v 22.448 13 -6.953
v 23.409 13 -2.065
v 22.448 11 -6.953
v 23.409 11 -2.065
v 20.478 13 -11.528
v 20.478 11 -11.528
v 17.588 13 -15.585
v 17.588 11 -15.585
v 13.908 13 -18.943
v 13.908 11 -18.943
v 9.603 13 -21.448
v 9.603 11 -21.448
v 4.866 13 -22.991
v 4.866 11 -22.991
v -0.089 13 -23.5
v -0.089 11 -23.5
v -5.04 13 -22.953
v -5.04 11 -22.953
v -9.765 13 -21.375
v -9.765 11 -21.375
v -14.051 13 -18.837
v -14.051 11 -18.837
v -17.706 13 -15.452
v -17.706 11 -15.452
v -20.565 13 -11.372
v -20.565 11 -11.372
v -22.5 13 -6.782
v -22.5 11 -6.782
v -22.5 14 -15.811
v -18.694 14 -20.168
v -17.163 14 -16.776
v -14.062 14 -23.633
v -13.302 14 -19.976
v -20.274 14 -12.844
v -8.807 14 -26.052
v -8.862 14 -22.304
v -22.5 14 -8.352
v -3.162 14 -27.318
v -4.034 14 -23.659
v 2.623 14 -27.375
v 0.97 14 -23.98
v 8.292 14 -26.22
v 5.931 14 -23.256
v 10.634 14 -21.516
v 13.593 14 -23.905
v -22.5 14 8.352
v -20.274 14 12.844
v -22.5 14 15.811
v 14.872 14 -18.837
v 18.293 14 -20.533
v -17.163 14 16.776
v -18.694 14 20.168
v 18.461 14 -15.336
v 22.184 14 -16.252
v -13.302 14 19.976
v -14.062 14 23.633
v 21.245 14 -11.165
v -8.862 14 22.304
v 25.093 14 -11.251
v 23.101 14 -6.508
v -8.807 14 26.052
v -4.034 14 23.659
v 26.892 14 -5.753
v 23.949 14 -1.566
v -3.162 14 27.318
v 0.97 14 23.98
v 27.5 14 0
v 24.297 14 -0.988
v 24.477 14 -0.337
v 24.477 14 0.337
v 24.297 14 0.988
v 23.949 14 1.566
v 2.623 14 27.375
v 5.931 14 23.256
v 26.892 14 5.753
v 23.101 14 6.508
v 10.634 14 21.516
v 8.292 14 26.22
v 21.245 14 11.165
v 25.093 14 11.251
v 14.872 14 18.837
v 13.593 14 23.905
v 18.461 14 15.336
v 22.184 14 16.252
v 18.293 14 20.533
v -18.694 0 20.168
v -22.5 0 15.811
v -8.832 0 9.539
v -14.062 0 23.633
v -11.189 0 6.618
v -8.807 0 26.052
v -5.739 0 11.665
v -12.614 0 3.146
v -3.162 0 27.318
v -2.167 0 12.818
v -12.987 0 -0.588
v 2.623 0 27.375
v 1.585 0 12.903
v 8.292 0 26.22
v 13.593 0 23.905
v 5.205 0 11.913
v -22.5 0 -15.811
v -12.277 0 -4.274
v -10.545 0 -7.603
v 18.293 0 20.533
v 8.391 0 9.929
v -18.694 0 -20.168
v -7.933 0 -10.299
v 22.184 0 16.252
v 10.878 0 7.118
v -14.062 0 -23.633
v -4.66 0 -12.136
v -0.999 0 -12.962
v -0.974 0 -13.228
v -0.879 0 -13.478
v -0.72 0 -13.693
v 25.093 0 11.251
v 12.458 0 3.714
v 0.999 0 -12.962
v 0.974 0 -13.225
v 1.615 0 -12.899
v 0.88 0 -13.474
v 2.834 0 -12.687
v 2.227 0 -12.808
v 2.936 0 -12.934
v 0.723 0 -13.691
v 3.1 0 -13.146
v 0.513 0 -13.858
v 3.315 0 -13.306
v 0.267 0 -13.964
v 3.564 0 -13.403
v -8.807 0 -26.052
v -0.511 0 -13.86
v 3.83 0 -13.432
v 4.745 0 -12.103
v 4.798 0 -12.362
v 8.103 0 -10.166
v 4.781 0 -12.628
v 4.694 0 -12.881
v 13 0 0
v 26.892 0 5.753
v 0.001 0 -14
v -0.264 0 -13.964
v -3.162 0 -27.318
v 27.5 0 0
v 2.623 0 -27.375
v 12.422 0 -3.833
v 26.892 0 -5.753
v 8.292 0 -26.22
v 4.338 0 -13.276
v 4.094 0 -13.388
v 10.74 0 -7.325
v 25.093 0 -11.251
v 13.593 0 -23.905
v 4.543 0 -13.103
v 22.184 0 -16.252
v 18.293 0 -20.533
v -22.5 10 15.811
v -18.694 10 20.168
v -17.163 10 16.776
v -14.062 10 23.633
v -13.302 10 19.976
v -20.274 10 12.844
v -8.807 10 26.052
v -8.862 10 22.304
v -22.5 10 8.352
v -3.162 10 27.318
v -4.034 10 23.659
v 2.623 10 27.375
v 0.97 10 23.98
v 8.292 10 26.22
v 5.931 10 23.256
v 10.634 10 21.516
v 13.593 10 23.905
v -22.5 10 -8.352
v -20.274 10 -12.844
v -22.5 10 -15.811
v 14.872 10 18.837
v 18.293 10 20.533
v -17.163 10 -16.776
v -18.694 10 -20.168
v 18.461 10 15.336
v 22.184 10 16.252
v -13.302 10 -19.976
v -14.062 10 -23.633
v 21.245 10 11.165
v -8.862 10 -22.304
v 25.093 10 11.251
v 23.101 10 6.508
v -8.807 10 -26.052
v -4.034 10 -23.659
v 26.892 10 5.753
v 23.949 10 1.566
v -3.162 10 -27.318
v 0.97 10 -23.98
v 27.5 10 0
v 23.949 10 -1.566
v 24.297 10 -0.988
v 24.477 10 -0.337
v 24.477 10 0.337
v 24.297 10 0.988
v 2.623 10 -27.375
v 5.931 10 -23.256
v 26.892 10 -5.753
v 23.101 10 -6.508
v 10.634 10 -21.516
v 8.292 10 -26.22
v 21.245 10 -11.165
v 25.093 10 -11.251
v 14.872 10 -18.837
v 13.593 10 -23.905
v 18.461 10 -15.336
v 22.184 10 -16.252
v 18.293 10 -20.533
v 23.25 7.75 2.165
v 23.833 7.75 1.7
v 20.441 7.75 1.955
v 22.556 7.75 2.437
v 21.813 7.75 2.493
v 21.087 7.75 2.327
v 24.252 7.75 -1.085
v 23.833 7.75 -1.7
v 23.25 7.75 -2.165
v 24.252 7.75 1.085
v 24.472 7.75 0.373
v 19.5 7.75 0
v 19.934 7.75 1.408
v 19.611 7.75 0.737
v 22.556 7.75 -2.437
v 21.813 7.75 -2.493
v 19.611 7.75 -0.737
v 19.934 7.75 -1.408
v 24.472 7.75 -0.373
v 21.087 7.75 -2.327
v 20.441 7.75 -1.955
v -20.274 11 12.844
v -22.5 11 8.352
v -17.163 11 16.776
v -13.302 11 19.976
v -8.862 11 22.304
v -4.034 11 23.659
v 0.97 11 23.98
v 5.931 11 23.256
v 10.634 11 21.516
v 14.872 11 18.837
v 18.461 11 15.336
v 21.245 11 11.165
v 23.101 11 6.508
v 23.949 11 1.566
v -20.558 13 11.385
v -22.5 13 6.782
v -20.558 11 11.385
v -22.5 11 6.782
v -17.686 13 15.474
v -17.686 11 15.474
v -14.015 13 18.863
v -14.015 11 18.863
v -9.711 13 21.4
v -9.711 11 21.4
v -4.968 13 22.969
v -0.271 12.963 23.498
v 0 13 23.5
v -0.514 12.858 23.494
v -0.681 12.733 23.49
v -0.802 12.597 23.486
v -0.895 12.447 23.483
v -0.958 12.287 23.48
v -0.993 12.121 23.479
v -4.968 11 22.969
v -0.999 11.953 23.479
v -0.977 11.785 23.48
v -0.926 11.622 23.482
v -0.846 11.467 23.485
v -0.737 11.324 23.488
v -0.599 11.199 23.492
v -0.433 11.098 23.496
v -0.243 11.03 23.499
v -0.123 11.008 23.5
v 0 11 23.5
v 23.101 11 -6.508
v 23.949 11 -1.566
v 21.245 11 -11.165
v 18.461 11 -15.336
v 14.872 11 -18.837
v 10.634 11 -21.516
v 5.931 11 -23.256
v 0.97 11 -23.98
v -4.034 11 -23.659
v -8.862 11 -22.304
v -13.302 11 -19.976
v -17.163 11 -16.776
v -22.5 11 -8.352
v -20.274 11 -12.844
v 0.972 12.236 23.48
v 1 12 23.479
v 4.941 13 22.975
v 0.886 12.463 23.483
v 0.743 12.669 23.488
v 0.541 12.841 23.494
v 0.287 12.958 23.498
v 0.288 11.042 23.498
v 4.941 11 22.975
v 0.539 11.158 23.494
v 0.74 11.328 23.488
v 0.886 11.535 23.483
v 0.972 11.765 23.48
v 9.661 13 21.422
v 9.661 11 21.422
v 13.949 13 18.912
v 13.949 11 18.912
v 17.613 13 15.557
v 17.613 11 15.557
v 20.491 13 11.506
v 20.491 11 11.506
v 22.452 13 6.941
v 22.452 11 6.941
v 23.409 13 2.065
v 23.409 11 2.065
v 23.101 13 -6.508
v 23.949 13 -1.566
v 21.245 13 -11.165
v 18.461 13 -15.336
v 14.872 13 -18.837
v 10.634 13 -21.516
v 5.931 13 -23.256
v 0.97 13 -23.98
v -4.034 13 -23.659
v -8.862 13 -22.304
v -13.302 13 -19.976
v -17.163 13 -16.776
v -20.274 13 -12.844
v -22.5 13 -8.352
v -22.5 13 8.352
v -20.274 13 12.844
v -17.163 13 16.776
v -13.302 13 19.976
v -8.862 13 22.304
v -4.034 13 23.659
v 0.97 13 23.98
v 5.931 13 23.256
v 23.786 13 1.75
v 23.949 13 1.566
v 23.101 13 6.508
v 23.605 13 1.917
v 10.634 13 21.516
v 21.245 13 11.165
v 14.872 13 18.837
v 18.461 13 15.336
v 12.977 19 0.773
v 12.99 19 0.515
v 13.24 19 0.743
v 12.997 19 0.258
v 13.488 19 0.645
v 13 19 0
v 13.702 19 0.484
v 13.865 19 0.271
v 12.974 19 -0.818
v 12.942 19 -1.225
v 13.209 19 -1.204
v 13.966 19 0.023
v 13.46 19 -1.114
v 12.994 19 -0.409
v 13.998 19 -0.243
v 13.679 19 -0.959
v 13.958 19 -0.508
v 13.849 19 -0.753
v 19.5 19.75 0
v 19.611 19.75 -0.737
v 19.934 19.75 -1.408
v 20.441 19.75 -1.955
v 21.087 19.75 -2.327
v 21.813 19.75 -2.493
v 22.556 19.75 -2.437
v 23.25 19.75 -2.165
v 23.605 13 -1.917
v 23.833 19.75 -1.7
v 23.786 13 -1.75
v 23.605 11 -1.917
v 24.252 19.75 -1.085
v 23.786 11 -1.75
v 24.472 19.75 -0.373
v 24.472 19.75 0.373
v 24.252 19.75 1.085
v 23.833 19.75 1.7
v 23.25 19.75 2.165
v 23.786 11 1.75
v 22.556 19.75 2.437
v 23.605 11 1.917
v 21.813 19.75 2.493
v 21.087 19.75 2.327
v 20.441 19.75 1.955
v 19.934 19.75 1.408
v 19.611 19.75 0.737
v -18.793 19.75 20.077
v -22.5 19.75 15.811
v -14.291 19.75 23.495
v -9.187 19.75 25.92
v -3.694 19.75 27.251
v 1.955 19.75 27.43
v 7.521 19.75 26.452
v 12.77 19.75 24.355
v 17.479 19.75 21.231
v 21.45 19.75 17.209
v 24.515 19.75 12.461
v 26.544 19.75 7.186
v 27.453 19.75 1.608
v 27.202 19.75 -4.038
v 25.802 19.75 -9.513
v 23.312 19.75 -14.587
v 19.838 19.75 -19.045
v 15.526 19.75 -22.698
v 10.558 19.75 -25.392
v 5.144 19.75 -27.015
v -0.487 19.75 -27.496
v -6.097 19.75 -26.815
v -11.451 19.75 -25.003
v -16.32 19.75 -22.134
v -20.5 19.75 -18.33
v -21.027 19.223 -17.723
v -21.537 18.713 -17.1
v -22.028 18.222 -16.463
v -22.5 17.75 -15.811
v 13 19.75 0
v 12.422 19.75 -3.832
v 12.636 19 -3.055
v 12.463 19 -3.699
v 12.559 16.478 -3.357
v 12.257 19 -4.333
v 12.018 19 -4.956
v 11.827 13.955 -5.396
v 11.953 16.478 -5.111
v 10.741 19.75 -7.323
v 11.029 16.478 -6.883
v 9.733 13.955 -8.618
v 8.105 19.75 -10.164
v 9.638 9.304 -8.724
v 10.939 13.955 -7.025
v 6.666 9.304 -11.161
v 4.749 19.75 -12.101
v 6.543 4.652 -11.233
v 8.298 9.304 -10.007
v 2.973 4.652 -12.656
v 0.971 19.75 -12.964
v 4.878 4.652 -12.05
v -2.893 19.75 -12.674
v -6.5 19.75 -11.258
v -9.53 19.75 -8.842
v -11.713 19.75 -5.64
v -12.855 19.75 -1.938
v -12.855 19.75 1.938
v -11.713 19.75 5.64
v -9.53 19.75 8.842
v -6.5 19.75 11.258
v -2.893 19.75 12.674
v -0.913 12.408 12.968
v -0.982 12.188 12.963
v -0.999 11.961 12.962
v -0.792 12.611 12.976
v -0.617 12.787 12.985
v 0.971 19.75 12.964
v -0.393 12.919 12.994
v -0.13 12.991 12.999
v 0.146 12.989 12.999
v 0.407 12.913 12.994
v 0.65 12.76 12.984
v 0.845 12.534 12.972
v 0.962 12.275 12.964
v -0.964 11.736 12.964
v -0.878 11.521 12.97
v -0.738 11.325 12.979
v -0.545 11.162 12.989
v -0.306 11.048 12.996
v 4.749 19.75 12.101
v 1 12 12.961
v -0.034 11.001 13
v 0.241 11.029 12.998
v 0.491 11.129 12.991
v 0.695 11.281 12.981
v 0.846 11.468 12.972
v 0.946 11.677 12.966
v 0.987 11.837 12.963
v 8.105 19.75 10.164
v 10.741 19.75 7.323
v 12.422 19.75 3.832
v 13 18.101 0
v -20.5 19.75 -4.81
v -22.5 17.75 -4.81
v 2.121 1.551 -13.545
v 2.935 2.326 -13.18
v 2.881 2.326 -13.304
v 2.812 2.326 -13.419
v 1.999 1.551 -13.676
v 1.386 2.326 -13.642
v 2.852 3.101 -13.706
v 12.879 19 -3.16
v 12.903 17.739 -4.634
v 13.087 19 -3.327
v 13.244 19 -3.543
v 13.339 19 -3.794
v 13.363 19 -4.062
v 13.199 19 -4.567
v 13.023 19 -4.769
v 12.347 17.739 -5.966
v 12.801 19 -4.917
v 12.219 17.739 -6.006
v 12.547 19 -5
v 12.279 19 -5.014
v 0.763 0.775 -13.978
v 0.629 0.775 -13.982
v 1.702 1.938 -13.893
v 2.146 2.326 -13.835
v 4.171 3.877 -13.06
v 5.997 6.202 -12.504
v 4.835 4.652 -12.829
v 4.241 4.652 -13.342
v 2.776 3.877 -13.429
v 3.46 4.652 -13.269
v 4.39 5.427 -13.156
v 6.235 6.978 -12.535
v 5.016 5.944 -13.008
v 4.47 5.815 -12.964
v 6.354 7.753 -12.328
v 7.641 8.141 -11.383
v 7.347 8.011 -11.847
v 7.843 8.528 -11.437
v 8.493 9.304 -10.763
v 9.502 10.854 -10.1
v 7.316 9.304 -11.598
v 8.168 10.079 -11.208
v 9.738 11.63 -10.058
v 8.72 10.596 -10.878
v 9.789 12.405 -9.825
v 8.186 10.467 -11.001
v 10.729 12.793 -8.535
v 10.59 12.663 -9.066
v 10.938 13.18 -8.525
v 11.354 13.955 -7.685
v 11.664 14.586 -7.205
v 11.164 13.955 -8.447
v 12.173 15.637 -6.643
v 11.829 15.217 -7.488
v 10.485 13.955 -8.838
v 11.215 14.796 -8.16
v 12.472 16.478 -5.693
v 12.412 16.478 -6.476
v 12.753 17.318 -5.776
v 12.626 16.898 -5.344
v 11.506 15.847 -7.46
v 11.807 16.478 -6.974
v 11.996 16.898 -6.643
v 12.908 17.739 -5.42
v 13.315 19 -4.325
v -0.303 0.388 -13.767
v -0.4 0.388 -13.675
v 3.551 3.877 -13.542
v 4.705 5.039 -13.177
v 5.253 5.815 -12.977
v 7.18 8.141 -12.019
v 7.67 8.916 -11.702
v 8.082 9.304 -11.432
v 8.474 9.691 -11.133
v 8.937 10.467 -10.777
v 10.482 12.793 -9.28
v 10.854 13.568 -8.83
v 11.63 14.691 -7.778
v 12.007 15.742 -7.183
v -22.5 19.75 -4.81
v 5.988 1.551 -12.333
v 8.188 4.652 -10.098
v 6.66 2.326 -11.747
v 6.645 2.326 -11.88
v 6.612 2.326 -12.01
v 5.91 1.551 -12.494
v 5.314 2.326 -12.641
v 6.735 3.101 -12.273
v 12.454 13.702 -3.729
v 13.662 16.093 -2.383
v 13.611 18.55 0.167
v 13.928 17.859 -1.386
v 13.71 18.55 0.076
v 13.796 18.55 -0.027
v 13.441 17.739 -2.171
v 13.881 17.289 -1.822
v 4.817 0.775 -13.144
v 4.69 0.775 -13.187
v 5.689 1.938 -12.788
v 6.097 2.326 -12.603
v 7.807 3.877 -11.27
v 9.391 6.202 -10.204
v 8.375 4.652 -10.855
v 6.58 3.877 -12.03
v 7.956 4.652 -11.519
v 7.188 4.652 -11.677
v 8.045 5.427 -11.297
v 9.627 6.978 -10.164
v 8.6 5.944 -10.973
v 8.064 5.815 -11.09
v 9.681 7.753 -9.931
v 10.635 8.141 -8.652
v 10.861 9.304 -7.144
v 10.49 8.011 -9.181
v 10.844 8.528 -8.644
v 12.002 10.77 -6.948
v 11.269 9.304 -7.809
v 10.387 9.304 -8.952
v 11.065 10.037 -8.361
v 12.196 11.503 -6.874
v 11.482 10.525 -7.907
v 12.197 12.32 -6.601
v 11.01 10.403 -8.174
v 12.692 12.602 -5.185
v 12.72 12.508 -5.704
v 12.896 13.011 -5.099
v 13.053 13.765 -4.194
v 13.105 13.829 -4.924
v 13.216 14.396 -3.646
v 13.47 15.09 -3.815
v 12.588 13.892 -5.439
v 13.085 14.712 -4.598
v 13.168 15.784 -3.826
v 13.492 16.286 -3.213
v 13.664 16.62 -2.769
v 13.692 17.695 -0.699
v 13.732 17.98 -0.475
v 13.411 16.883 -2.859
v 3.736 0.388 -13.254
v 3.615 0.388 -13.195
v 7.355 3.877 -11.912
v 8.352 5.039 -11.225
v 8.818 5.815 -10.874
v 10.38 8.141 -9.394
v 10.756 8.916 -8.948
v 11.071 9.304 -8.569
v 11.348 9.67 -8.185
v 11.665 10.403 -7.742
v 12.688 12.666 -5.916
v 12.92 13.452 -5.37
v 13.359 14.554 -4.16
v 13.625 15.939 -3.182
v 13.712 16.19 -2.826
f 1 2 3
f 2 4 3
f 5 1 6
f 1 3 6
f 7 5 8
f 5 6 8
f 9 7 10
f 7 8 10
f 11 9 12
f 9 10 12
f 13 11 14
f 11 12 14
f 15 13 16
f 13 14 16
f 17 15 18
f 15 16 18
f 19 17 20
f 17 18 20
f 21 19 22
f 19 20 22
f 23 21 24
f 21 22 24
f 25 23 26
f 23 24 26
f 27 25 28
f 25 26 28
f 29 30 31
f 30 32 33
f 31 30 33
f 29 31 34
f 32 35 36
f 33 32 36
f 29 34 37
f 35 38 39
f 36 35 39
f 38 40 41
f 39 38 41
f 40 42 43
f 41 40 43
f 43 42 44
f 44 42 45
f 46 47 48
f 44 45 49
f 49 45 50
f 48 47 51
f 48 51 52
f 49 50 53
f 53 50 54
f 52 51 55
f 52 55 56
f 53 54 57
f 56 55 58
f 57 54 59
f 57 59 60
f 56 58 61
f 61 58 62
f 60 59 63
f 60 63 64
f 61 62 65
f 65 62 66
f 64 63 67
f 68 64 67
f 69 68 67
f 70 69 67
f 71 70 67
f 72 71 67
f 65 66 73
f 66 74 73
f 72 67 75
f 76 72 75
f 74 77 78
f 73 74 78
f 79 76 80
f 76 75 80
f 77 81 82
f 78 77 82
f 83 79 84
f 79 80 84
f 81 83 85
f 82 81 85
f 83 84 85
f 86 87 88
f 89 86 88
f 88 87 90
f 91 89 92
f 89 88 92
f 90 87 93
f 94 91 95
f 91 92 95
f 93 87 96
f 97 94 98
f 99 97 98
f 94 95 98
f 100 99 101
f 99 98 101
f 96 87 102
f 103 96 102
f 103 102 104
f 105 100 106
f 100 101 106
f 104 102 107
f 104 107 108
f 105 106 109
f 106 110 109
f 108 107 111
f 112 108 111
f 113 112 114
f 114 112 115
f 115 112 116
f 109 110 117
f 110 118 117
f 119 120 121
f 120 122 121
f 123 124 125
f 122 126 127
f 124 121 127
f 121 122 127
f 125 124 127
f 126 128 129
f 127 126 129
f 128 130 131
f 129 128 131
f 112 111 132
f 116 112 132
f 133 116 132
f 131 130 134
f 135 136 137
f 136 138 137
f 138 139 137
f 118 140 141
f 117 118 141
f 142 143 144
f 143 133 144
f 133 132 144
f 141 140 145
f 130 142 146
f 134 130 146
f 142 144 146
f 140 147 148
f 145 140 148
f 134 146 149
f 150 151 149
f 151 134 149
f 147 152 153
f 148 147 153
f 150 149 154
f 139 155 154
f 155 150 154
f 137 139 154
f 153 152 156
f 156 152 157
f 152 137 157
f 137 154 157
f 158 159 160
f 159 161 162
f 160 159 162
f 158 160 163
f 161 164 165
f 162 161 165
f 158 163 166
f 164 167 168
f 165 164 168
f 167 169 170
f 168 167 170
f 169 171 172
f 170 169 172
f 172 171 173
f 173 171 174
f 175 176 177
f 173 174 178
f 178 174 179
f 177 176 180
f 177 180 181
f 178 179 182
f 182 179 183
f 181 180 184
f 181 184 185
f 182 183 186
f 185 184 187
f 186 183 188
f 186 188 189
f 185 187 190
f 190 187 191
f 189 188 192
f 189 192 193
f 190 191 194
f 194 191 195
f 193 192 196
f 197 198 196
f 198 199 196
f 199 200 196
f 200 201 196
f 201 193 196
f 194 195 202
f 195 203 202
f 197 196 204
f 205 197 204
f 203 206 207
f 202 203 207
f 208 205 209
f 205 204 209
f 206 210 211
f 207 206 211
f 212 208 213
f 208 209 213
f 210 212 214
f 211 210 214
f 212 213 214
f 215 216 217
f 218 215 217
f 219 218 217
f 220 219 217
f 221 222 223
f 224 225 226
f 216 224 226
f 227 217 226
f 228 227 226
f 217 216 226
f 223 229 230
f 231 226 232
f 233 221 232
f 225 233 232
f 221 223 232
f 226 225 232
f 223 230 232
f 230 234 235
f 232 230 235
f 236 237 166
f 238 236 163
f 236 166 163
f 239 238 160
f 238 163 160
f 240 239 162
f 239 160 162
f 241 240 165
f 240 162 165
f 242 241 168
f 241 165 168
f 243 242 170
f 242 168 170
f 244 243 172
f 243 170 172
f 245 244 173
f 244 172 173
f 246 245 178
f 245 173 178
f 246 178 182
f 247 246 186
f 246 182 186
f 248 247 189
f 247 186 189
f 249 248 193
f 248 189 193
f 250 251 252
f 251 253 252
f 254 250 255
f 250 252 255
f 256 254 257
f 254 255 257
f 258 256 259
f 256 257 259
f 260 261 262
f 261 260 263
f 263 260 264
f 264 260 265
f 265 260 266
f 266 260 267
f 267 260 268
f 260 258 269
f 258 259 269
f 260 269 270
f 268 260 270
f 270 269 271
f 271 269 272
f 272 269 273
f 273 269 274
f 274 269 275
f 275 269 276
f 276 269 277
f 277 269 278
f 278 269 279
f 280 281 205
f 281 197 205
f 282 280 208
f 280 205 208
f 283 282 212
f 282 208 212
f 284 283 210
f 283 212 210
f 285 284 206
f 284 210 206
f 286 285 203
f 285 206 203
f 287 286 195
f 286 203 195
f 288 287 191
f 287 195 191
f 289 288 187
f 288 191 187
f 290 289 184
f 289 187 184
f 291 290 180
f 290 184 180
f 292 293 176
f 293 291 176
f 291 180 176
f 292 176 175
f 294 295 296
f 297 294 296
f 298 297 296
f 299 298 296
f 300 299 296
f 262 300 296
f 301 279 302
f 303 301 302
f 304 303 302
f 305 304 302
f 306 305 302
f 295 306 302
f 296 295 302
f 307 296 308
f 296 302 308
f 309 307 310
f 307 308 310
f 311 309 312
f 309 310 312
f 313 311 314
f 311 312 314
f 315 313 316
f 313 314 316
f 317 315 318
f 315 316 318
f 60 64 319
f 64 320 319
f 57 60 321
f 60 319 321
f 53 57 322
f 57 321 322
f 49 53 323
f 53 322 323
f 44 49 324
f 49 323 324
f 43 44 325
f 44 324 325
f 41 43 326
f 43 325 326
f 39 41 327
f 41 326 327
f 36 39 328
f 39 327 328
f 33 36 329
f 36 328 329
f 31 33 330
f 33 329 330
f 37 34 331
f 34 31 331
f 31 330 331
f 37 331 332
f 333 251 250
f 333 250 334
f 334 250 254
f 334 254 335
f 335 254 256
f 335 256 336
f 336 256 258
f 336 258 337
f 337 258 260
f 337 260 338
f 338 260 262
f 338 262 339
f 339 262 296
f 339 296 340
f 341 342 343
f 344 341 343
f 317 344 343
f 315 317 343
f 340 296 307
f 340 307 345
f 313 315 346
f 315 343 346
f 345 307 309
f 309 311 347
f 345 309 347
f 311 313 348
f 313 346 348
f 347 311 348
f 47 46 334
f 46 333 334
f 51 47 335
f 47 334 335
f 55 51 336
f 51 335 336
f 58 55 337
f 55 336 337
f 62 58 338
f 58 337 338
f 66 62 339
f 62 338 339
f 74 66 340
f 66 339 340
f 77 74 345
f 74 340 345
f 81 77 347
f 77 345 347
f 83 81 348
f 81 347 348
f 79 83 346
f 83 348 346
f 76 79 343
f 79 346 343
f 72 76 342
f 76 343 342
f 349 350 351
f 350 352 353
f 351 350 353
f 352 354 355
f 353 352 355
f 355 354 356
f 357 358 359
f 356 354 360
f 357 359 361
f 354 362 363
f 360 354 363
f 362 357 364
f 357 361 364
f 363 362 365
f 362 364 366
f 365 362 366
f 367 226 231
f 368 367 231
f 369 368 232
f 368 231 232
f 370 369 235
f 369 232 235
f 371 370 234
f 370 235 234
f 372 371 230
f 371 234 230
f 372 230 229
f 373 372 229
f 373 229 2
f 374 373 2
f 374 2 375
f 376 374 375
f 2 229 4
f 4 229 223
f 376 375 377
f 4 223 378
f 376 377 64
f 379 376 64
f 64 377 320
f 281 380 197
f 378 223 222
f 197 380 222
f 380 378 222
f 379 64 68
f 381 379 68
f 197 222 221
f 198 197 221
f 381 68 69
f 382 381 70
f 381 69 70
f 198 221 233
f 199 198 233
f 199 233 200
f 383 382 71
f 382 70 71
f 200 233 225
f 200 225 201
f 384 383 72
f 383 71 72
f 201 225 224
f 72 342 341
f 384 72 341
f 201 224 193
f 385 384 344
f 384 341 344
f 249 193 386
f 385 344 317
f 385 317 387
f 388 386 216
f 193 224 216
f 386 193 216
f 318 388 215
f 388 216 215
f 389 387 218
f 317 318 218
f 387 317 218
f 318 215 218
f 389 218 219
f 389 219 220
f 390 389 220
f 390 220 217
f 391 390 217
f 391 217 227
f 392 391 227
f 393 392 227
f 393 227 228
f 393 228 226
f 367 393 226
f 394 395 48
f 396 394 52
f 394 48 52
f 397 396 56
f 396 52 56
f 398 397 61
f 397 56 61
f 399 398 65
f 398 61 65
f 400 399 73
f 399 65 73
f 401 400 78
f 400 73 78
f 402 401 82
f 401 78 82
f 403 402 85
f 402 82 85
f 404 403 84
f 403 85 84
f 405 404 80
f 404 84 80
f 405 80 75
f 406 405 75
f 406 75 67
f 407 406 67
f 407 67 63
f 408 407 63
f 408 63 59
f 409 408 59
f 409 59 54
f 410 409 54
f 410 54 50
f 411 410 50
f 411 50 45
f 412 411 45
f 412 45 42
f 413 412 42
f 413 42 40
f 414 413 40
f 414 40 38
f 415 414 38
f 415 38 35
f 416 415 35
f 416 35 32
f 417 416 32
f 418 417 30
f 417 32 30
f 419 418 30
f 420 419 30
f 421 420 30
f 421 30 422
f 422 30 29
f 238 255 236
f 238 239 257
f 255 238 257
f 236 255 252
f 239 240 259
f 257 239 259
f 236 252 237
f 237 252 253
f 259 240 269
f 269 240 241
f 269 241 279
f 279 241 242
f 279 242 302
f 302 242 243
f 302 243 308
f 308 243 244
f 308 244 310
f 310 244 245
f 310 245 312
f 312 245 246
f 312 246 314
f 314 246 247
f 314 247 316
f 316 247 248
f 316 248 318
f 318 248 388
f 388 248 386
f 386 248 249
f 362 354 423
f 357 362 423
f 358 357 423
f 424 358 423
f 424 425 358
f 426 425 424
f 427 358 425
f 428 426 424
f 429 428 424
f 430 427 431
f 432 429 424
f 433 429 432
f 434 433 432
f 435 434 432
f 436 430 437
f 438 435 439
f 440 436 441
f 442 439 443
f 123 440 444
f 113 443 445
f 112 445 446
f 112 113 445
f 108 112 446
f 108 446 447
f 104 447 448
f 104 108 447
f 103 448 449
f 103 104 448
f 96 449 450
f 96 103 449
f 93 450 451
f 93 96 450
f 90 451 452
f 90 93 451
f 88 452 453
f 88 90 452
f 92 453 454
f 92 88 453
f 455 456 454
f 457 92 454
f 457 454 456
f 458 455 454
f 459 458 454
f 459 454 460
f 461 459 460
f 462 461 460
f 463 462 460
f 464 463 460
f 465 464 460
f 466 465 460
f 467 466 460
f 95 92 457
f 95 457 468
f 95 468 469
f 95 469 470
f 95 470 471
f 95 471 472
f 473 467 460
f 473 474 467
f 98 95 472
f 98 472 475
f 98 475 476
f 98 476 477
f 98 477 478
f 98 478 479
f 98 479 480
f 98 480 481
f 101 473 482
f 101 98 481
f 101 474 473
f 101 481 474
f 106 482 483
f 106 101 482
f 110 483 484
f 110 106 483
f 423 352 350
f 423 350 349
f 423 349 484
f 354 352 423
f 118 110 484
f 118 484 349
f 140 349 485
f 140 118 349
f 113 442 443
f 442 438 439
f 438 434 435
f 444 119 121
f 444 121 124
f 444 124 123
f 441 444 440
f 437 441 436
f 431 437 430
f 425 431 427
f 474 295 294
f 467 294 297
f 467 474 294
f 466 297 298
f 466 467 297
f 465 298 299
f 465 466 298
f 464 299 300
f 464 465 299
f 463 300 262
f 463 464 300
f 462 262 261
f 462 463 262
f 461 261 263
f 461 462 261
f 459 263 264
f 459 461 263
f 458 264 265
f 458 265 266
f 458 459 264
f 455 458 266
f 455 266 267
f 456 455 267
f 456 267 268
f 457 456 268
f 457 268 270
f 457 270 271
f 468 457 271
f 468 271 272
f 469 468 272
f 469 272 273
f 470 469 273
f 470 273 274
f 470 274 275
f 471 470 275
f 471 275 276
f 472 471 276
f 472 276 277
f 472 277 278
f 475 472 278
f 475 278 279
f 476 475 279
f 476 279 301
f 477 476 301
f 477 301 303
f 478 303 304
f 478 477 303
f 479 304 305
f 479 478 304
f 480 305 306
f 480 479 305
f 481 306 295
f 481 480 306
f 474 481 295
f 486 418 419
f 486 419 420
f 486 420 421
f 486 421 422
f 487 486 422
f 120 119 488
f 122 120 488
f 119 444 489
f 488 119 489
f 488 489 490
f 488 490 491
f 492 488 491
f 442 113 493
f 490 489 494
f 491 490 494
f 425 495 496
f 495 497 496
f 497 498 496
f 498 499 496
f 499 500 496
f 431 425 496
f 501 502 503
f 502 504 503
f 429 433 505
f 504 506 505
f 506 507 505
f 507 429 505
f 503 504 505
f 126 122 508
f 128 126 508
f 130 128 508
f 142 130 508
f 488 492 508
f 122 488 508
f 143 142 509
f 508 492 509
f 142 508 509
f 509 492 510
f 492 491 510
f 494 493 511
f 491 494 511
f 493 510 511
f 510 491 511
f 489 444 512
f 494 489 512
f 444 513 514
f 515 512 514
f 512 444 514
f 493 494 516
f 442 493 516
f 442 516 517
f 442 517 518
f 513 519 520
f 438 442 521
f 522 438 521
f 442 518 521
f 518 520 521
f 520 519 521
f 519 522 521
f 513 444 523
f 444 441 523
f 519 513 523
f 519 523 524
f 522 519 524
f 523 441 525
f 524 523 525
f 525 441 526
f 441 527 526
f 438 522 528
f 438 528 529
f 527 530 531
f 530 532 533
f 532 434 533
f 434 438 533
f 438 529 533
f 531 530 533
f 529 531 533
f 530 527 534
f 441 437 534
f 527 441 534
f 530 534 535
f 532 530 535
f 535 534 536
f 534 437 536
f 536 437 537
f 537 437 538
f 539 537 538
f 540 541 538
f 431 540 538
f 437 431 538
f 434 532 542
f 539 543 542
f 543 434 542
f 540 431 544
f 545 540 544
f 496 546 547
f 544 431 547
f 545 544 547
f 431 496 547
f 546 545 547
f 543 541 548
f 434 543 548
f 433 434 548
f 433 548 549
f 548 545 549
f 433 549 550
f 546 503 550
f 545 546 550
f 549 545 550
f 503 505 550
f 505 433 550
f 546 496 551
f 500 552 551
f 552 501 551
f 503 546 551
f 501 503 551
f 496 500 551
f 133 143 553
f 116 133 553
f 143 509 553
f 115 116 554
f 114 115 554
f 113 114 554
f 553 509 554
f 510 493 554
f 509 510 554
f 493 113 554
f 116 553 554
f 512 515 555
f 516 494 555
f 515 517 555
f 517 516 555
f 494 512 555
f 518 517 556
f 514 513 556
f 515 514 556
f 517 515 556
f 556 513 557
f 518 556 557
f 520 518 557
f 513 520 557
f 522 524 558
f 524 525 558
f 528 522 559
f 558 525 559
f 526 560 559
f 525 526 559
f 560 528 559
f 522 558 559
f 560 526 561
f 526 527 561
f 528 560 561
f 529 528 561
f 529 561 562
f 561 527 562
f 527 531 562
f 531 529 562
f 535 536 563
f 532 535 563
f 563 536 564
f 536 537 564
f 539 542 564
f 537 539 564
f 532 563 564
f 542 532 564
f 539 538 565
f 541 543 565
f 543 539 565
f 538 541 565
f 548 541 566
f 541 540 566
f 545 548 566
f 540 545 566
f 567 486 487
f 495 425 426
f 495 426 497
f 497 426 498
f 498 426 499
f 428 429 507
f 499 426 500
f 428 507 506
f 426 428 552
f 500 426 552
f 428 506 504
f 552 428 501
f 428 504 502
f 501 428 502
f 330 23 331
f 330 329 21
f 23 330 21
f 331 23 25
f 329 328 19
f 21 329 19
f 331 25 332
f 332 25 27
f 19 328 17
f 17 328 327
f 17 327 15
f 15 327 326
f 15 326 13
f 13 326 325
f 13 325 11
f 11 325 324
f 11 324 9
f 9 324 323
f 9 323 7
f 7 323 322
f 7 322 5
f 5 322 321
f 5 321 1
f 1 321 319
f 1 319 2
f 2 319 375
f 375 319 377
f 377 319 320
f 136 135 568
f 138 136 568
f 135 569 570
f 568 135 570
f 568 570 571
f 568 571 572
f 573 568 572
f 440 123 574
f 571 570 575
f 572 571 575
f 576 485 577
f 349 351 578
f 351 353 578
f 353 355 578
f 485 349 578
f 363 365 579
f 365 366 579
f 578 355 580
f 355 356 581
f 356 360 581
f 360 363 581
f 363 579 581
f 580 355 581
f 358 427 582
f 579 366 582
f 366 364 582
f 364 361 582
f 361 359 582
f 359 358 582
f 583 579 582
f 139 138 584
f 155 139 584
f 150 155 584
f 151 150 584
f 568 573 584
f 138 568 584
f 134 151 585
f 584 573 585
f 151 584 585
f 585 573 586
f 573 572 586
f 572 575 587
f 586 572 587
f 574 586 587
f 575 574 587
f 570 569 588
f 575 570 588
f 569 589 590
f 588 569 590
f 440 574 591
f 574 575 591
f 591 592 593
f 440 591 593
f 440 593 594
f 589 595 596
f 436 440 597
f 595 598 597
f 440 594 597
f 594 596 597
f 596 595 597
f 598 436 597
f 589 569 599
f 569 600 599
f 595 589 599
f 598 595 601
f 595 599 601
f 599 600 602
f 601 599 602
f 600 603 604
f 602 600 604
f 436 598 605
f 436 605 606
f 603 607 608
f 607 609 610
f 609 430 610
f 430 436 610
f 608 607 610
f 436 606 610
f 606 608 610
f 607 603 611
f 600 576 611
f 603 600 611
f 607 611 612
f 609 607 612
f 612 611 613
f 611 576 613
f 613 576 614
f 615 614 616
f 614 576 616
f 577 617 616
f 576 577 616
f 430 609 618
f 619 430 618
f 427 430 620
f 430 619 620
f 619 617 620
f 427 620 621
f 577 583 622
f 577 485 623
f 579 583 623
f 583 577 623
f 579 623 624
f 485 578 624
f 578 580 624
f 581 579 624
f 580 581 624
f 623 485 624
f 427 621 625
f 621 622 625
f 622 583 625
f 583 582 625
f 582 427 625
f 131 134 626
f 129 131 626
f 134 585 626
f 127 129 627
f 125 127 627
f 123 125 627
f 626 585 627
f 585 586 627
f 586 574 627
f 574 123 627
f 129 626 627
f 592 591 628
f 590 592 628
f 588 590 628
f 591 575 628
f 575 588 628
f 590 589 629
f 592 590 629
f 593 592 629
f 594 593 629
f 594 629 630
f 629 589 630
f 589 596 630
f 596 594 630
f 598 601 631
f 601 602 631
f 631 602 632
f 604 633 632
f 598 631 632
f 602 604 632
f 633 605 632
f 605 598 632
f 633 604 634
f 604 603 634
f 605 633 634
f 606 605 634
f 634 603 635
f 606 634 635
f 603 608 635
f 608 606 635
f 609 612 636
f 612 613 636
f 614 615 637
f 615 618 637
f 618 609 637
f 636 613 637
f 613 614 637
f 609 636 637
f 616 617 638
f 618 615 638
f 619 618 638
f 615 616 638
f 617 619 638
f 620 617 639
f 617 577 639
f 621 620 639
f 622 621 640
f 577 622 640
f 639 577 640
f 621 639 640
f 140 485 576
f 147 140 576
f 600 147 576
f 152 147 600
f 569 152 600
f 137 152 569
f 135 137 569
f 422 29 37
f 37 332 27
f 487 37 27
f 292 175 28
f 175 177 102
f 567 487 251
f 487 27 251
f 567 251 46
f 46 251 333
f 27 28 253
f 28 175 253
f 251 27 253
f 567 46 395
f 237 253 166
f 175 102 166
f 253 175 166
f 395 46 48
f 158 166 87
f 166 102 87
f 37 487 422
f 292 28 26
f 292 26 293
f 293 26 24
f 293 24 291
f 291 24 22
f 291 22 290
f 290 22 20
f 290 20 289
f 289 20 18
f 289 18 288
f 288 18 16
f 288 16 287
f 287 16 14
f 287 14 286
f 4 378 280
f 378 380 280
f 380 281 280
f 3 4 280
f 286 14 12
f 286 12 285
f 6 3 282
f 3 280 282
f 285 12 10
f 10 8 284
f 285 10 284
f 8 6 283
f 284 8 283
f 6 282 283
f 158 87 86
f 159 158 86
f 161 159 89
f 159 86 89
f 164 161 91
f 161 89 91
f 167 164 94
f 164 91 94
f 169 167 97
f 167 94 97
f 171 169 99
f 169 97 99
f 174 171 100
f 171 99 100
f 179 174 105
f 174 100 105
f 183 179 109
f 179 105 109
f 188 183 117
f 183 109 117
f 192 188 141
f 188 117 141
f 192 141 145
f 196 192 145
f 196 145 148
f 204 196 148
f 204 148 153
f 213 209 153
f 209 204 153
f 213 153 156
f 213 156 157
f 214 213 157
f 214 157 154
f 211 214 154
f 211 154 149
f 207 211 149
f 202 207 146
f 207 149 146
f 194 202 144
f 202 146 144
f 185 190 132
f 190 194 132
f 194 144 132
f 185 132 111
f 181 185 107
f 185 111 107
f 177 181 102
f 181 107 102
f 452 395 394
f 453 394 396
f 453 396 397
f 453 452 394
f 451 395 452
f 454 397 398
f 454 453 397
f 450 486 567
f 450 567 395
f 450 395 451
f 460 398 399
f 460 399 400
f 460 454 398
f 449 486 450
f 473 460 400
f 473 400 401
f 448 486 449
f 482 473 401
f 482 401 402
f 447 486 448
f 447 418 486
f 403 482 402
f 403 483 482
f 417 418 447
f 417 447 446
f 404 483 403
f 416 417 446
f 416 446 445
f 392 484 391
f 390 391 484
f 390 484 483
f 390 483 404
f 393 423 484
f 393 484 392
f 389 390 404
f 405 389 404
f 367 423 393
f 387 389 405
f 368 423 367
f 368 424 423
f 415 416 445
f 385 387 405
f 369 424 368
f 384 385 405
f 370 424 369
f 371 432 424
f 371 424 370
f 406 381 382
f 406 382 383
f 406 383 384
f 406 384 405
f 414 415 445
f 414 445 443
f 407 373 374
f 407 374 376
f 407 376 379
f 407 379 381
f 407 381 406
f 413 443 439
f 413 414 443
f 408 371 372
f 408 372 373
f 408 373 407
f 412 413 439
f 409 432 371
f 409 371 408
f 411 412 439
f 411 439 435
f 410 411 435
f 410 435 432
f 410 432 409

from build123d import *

# Parameters (mm, degrees)
EXTRUDE_1_DEPTH           = 19.75
SKETCH_2_R                = 13
CUT_EXTRUDE_2_DEPTH       = 20.75
CUT_EXTRUDE_4_DEPTH       = 23.69
HOLE_WIZARD_5_0_5_1_D     = 5
HOLE_WIZARD_5_0_5_1_DEPTH = 12
SKETCH_9_R                = 1
CUT_EXTRUDE_5_DEPTH       = 28.5
SWEEP_1_PITCH             = 95
SWEEP_1_HEIGHT            = 19
SWEEP_1_RADIUS            = 13
SWEEP_1_START_ANGLE       = -180
SKETCH_11_R               = 1
PATTERN_CIRCULAR_1_COUNT  = 2
PATTERN_CIRCULAR_1_ANGLE  = 17


with BuildPart() as part:
    # Эскиз1 → Бобышка-Вытянуть1 (new body)
    with BuildSketch(Plane(origin=(0, 0, 0), x_dir=(1, 0, 0), z_dir=(0, 1, 0))):
        with BuildLine():
            Line((-22.5, 15.811388301), (-22.5, -15.811388301))
            ThreePointArc((-22.5, -15.811388301), (27.5, 0), (-22.5, 15.811388301))
        make_face()
    extrude(amount=EXTRUDE_1_DEPTH)

    # Эскиз2 → Вырез-Вытянуть2 (cut, through all)
    with BuildSketch(Plane(origin=(0, 0, 0), x_dir=(1, 0, 0), z_dir=(0, 1, 0))):
        Circle(SKETCH_2_R)
    extrude(amount=CUT_EXTRUDE_2_DEPTH, mode=Mode.SUBTRACT)

    # Эскиз3 → Вырез-Повернуть1 (revolve, cut)
    with BuildSketch(Plane(origin=(0, 0, 0), x_dir=(0, 0, -1), z_dir=(1, 0, 0))):
        Polygon((-29, 14), (-24, 14), (-24, 13), (-23.5, 13), (-23.5, 11), (-24, 11), (-24, 10), (-29, 10), align=None)
    revolve(axis=Axis((0, 0, 0), (0, 1, 0)), mode=Mode.SUBTRACT)

    # Эскиз5 → Вырез-Вытянуть4 (cut, through all)
    with BuildSketch(Plane.XY.offset(-4.81)):
        Polygon((-22.5, 19.75), (-20.5, 19.75), (-22.5, 17.75), align=None)
    extrude(amount=-CUT_EXTRUDE_4_DEPTH, mode=Mode.SUBTRACT)

    # Диаметр отверстия Ø5.0 (5)1
    with Locations(Plane(origin=(0, 19.75, 0), x_dir=(1, 0, 0), z_dir=(0, 1, 0))):
        with Locations((22, 0)):
            Hole(HOLE_WIZARD_5_0_5_1_D / 2, depth=HOLE_WIZARD_5_0_5_1_DEPTH)

    # Эскиз9 → Вырез-Вытянуть5 (cut, through all)
    with BuildSketch(Plane.XY):
        with Locations((0, 12)):
            Circle(SKETCH_9_R)
    extrude(amount=CUT_EXTRUDE_5_DEPTH, mode=Mode.SUBTRACT)

    # Вырез-По траектории1: sweep along a helix
    with BuildLine() as sweep_1_path:
        add(Helix(SWEEP_1_PITCH, SWEEP_1_HEIGHT, SWEEP_1_RADIUS, center=(0, 0, 0), direction=(0, 1, 0), lefthand=True, mode=Mode.PRIVATE).rotate(Axis((0, 0, 0), (0, 1, 0)), SWEEP_1_START_ANGLE))
    # Эскиз11 → Вырез-По траектории1 (sweep, cut)
    with BuildSketch(Plane(origin=(0, 0, 0), x_dir=(1, 0, 0), z_dir=(0, 1, 0))):
        with Locations((0, 13)):
            Circle(SKETCH_11_R)
    sweep_1 = sweep(path=sweep_1_path.line, is_frenet=True, mode=Mode.SUBTRACT)

    # Круговой массив1: Вырез-По траектории1 ×2 about axis
    pattern_circular_1_axis = Axis((0, 19.75, 0), (0, -1, 0))
    for i in range(1, PATTERN_CIRCULAR_1_COUNT):
        add(sweep_1.rotate(pattern_circular_1_axis, i * PATTERN_CIRCULAR_1_ANGLE / (PATTERN_CIRCULAR_1_COUNT - 1)), mode=Mode.SUBTRACT)


solid = part.part
